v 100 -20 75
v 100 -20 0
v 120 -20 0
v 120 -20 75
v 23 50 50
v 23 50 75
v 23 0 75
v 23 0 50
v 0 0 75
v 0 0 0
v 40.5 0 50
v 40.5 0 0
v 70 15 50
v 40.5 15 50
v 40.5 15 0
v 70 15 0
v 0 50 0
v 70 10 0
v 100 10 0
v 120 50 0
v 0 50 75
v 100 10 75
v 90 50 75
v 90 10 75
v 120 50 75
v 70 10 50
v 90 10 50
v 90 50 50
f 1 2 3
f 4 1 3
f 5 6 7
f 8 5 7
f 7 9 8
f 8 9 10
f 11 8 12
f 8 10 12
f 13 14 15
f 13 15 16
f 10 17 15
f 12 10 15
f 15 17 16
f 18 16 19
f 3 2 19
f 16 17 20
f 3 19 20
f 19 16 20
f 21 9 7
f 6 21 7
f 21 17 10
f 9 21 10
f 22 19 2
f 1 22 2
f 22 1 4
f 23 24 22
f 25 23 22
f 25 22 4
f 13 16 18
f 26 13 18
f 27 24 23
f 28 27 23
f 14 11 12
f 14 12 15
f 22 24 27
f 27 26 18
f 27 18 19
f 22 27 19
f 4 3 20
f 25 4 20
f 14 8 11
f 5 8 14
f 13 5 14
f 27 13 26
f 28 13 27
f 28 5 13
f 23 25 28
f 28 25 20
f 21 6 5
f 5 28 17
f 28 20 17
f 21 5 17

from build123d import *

# Parameters (mm, degrees)
F1_DEPTH = 75
F3_DEPTH = 25


with BuildPart() as f1:
    # F0 (on Top) → F1 (new body)
    with BuildSketch(Plane.XY):
        Polygon((0, 50), (0, 0), (40.5, 0), (40.5, 15), (70, 15), (70, 10), (100, 10), (100, -20), (120, -20), (120, 50), align=None)
    extrude(amount=F1_DEPTH)

    # F2 (on face) → F3 (cut)
    with BuildSketch(Plane.XY.offset(75)):
        Polygon((23, 50), (23, 0), (40.5, 0), (40.5, 15), (70, 15), (70, 10), (90, 10), (90, 50), align=None)
    extrude(amount=-F3_DEPTH, mode=Mode.SUBTRACT)


solid = f1.part
